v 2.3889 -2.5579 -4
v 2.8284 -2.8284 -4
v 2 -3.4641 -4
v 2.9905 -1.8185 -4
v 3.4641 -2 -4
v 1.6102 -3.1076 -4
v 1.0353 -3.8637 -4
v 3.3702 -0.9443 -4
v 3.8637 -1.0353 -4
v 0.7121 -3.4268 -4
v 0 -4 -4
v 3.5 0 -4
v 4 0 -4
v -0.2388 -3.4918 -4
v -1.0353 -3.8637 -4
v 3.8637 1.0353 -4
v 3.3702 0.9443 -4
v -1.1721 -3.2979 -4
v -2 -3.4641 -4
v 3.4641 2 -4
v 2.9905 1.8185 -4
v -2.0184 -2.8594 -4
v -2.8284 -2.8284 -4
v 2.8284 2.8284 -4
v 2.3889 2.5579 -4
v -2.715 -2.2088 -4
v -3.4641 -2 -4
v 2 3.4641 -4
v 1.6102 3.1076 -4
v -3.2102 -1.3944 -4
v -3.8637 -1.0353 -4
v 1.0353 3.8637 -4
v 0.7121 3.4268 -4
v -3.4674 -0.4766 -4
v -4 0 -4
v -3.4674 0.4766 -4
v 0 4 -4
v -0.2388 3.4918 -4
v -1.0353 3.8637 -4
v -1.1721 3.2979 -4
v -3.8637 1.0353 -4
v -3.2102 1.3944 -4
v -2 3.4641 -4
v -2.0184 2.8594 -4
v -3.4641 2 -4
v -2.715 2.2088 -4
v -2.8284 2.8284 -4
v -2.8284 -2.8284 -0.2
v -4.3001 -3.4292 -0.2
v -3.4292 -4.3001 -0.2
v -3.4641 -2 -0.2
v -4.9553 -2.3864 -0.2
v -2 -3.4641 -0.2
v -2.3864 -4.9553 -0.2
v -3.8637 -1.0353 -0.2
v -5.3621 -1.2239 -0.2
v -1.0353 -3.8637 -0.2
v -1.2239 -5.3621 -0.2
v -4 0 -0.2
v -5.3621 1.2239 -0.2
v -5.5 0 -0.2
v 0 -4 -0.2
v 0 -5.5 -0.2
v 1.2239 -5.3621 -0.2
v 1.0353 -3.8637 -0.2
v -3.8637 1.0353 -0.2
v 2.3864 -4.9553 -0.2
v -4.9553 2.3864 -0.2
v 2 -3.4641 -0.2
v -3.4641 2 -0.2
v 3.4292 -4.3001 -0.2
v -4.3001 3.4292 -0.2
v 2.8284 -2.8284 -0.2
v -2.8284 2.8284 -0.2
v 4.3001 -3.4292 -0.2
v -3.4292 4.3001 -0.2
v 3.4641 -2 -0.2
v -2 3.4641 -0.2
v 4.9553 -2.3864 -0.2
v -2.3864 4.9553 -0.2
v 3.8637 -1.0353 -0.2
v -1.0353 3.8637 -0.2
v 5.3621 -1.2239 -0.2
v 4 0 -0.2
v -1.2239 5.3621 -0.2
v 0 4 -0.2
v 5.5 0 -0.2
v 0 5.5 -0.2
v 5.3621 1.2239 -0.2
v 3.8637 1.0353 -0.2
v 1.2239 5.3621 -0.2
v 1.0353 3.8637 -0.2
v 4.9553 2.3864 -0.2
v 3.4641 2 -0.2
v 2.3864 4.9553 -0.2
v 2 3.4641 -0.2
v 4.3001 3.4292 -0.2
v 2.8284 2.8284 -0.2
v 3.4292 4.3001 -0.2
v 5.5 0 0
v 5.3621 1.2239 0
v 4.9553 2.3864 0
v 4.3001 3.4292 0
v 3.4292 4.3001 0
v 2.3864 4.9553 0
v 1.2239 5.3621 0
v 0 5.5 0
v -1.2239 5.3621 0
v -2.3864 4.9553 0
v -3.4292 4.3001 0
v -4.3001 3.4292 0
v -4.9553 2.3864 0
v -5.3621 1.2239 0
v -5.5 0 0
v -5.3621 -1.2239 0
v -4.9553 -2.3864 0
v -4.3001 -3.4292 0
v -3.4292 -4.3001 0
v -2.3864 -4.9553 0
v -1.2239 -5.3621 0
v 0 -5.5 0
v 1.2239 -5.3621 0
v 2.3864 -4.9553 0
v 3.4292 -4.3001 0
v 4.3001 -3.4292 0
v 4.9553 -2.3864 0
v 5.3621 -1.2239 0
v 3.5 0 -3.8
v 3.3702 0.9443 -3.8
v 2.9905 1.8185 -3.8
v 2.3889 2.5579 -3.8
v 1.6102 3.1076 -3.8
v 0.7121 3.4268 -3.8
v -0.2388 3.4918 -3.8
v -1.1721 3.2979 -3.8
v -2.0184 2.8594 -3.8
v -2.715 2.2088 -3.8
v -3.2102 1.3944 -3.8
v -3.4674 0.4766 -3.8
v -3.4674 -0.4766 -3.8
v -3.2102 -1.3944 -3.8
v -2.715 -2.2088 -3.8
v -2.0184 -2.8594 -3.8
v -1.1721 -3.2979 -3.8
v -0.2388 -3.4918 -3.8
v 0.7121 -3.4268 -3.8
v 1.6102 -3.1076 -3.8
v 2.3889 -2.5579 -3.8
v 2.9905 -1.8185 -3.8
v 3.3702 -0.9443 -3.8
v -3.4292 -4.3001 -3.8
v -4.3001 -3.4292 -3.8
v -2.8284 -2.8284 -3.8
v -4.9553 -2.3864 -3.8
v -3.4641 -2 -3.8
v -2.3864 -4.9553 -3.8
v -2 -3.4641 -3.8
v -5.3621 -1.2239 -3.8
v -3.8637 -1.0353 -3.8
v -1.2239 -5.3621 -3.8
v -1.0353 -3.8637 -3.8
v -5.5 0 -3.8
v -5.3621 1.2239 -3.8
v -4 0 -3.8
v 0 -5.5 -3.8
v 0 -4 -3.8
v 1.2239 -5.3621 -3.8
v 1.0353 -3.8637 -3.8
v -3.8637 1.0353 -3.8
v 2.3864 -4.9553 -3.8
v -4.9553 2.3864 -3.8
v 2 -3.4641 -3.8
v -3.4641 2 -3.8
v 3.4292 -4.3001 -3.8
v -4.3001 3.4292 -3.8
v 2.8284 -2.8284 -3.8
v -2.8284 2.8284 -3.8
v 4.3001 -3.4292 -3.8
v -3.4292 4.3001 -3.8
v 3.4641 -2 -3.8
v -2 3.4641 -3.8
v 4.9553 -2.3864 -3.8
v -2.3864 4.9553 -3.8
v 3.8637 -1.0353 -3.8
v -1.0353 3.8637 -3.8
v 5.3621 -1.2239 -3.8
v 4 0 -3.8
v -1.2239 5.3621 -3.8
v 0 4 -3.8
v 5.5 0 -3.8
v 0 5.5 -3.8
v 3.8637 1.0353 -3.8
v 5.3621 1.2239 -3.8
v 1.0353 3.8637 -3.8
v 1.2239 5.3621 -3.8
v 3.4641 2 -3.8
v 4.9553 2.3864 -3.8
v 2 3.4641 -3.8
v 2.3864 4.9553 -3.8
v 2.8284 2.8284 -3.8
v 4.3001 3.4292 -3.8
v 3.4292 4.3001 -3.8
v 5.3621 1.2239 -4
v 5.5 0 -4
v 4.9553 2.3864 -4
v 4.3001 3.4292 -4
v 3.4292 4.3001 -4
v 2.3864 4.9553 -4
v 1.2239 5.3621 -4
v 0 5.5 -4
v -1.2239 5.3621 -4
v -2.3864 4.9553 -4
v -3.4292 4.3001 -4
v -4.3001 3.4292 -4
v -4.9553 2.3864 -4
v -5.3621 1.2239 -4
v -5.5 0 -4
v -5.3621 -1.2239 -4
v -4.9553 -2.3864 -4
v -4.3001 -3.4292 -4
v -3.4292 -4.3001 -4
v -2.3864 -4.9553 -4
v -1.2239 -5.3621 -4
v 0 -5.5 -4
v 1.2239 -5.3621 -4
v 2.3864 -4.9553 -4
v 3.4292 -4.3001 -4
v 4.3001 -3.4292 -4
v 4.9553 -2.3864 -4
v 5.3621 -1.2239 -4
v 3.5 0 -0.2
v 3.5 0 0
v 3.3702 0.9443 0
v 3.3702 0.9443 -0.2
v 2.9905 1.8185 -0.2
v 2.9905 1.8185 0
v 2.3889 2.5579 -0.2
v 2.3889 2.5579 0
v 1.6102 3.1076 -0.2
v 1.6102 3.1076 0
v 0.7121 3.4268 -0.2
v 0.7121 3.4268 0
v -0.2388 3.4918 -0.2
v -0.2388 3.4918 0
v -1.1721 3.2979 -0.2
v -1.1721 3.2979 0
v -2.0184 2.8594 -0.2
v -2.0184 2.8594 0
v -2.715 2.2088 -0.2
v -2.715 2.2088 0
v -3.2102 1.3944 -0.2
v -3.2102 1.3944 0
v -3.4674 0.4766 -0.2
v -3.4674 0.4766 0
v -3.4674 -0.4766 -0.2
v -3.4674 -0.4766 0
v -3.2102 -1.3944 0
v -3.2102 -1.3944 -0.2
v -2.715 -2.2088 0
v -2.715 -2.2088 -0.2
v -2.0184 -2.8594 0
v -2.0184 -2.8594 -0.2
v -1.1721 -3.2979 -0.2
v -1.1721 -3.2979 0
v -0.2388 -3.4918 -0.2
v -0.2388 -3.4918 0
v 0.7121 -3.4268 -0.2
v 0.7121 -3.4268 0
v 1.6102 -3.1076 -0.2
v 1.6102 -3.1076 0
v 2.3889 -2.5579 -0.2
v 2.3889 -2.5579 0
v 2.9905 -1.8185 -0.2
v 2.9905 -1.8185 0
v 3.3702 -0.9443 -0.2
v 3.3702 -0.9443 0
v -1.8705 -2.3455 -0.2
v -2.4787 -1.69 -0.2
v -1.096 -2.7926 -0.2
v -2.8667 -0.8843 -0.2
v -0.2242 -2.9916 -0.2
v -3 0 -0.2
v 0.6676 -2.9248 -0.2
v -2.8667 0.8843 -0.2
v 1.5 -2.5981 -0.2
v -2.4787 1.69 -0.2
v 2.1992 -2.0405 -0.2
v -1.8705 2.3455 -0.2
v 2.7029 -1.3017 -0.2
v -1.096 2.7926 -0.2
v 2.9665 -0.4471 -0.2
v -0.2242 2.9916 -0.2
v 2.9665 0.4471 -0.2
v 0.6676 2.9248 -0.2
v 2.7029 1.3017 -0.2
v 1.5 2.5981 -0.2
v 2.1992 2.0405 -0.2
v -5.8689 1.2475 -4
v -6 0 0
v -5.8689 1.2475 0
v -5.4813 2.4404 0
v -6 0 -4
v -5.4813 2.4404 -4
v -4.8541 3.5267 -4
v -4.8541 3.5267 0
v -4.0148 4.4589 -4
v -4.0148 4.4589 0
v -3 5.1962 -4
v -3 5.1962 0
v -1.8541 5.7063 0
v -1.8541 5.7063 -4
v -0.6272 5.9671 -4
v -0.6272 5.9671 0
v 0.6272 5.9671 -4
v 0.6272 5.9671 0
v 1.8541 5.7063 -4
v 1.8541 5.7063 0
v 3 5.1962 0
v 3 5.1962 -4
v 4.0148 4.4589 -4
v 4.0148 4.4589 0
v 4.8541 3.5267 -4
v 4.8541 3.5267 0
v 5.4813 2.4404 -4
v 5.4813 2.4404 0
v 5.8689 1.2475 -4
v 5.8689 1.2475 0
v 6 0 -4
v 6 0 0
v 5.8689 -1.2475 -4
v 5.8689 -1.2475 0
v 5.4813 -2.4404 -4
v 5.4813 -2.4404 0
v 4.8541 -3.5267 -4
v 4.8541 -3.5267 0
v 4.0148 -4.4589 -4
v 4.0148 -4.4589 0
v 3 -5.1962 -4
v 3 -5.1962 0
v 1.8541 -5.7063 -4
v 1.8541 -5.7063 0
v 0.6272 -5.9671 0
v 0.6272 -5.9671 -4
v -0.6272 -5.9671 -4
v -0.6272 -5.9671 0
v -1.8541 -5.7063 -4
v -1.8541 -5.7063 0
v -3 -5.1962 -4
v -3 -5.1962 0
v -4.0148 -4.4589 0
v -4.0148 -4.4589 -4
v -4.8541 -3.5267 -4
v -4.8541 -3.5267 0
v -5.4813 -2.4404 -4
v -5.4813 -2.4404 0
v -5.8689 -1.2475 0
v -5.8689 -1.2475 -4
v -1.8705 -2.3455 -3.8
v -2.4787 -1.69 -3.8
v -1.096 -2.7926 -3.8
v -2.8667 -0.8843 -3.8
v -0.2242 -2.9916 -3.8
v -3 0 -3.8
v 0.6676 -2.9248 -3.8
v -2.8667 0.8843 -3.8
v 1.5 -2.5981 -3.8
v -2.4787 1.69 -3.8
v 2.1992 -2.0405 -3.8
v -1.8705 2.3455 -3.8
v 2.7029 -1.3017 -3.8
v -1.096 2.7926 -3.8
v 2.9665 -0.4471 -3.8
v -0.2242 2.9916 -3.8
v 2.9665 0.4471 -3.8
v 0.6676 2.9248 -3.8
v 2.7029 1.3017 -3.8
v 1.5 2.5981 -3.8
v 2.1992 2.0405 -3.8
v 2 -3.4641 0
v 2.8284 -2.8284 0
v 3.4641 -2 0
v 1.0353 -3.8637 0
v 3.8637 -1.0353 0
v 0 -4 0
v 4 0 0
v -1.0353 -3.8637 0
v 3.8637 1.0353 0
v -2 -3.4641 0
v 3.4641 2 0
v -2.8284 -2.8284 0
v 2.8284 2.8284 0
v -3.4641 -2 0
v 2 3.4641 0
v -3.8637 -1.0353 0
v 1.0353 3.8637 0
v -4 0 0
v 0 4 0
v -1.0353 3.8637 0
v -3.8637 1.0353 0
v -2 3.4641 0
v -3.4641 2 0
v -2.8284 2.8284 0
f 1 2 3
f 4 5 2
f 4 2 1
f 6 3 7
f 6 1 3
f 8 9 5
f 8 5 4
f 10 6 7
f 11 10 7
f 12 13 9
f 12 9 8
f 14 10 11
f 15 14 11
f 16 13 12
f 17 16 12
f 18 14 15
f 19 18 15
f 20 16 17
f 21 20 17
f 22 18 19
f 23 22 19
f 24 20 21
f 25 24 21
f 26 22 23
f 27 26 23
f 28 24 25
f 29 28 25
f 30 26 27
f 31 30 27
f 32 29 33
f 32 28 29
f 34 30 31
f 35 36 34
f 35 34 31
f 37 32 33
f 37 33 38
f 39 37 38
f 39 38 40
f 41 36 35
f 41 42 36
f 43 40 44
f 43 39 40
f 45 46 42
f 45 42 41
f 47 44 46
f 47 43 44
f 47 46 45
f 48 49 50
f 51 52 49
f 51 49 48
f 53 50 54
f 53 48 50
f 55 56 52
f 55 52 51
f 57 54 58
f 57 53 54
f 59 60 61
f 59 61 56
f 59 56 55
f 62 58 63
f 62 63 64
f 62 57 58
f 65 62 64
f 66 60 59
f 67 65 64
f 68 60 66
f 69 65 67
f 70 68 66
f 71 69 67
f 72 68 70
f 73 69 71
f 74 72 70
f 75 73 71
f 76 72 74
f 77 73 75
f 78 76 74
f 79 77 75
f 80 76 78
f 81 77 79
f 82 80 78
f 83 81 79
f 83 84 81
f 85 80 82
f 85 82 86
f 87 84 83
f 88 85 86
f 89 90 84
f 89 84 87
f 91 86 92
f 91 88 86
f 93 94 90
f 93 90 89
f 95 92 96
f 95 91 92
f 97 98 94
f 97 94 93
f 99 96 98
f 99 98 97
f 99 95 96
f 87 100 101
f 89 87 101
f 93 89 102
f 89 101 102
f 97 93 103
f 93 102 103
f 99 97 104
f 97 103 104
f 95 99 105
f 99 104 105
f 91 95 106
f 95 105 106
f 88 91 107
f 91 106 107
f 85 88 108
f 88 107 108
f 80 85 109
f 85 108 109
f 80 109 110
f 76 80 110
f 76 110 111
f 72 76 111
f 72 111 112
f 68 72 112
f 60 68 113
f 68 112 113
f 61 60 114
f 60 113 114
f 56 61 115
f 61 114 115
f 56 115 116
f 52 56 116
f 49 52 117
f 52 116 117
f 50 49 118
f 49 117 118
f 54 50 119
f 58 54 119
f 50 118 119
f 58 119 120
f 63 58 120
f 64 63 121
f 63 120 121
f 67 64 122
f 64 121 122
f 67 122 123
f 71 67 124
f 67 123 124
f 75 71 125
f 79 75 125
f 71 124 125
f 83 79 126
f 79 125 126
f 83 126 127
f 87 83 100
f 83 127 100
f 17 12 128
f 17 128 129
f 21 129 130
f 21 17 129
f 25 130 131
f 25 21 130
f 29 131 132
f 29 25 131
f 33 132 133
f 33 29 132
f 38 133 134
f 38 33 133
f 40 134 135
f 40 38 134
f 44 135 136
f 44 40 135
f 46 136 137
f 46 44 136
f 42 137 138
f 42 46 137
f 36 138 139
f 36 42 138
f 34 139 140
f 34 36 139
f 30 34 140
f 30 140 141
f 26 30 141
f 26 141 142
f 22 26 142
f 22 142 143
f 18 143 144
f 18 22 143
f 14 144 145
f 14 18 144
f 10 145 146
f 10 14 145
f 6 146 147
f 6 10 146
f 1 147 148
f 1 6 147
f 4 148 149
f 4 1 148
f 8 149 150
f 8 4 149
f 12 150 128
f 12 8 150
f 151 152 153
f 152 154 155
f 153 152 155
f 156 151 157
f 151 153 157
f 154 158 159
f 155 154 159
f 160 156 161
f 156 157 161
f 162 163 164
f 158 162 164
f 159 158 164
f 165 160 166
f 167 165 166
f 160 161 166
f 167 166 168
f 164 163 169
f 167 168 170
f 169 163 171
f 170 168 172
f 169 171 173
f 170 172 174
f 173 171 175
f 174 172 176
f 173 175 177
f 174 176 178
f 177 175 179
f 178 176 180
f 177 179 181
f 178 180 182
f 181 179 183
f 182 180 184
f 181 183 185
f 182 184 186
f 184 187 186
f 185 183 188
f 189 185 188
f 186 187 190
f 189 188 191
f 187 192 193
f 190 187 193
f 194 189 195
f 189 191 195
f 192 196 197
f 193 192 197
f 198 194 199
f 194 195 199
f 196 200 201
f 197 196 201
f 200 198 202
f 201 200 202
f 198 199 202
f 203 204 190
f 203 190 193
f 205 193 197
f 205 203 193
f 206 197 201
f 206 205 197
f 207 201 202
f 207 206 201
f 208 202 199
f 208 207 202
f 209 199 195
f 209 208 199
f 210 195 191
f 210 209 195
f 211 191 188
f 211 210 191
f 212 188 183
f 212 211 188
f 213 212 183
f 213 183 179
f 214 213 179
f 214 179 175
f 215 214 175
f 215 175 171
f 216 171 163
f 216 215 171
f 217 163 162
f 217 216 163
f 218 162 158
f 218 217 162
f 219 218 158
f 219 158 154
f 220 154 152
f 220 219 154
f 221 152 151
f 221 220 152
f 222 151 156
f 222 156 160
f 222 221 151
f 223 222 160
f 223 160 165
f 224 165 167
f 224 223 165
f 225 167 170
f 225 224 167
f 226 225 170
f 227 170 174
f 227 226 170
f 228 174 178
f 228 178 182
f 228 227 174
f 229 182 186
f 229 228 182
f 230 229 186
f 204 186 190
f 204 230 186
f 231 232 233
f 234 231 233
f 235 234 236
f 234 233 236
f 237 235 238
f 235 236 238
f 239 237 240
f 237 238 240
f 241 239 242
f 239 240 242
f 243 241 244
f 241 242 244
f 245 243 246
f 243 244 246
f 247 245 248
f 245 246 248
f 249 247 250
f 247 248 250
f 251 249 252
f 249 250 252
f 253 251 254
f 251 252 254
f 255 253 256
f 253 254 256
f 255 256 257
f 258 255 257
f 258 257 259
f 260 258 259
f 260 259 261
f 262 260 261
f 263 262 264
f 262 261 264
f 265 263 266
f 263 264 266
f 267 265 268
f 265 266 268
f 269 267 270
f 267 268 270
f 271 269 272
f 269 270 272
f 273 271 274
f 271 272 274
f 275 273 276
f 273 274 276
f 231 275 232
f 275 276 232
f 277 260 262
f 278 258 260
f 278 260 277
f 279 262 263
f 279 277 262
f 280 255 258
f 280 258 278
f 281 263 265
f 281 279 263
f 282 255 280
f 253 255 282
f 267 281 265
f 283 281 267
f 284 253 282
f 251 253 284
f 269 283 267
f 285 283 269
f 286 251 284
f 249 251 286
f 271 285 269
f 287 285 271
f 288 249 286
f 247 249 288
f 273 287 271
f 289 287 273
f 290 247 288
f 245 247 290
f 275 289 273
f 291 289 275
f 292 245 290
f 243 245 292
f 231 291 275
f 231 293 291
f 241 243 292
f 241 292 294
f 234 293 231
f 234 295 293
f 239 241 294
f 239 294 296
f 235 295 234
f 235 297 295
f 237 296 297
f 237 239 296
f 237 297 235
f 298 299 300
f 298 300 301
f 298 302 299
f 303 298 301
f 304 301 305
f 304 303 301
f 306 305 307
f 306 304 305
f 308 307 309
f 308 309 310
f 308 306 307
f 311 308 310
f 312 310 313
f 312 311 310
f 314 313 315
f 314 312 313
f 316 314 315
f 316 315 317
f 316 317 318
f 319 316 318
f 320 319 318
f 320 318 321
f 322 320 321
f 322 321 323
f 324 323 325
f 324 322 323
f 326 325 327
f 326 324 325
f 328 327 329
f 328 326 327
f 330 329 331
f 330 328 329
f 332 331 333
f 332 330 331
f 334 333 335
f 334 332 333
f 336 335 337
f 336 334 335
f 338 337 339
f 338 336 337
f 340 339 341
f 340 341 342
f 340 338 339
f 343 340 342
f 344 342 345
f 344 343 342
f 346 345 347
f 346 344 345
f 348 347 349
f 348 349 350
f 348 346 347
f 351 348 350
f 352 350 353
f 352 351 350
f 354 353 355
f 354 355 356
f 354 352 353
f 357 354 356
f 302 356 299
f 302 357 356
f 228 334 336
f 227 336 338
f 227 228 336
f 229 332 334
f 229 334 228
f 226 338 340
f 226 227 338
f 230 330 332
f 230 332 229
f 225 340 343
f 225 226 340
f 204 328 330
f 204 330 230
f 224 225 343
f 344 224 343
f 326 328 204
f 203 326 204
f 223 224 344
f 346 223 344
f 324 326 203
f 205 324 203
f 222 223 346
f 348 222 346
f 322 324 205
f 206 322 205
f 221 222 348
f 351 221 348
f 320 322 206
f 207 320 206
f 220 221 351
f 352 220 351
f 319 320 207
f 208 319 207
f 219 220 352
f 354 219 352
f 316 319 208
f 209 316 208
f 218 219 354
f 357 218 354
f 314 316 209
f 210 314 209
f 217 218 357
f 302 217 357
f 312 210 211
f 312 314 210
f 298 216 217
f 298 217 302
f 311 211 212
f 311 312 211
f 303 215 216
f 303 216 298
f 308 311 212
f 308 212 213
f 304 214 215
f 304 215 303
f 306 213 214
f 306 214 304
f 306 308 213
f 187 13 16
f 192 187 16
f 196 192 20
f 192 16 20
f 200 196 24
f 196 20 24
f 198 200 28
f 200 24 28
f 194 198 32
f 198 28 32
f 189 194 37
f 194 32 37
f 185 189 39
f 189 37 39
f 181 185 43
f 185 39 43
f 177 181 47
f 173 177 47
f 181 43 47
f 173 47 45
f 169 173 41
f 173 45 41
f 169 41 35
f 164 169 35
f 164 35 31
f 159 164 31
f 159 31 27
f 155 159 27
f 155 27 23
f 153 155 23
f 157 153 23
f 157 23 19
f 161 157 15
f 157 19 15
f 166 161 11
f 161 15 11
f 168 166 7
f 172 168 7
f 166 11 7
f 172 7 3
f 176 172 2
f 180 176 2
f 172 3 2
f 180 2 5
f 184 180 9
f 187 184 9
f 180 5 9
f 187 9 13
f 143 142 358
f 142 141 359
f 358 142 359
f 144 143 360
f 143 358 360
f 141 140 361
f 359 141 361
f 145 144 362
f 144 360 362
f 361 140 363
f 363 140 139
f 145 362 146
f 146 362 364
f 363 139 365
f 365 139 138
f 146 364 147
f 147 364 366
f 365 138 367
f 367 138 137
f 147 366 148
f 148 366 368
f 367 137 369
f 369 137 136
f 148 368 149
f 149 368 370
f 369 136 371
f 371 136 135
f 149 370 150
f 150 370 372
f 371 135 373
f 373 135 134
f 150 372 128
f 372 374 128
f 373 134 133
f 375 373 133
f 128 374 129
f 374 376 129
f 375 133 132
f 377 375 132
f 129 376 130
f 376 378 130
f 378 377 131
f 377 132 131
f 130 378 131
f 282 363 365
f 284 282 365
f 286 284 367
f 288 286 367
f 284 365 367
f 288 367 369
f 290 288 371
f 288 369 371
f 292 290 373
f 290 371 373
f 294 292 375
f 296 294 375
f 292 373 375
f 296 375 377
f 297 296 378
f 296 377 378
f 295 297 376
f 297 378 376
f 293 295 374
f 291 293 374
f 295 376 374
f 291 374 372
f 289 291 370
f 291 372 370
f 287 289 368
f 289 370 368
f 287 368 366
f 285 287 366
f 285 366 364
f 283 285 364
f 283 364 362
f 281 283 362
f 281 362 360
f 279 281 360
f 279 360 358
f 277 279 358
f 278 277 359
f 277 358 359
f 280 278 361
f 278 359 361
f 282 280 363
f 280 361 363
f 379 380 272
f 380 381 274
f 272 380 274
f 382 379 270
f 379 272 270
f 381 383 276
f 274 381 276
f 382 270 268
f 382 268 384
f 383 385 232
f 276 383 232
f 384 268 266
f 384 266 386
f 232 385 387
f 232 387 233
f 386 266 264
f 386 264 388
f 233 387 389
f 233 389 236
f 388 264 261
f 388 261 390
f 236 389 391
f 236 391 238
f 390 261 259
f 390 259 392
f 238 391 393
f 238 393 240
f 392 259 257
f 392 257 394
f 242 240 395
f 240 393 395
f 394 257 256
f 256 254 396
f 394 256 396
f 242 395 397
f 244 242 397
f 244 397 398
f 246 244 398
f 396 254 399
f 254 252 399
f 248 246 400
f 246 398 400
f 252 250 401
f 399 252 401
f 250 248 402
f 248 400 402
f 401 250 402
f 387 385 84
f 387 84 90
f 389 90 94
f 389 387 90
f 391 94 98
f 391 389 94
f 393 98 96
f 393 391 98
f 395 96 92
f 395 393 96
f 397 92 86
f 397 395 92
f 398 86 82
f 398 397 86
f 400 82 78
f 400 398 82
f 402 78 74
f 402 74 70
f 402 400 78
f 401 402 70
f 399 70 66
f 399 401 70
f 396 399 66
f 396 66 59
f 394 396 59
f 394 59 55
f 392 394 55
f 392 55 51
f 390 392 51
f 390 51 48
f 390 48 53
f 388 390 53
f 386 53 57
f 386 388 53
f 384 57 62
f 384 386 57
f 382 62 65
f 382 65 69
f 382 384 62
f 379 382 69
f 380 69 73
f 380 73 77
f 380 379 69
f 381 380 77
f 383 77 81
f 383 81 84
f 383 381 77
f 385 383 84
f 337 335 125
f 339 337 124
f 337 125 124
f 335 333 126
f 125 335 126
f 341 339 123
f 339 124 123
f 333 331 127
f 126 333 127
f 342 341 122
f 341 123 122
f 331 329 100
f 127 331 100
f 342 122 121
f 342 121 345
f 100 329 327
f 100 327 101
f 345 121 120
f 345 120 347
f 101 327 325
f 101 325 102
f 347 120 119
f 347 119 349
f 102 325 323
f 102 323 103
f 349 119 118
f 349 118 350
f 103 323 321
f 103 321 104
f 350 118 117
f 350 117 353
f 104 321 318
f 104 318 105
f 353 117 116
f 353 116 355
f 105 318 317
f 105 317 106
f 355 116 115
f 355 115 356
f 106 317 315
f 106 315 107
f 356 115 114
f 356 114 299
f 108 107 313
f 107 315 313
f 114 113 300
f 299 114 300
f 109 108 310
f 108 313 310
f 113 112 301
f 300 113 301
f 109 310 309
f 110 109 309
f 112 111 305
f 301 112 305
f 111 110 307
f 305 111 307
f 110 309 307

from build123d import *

# Parameters (mm, degrees)
SKETCH_1_W          = 3
SKETCH_1_H          = 4
SKETCH_2_R          = 3.5
CUT_EXTRUDE_1_DEPTH = 0.2
SKETCH_3_R          = 5.5
SKETCH_3_R_2        = 4
CUT_EXTRUDE_2_DEPTH = 0.2


with BuildPart() as part:
    # Эскиз1 → Повернуть1 (revolve)
    with BuildSketch(Plane(origin=(0, 0, 0), x_dir=(1, 0, 0), z_dir=(0, 1, 0))):
        with Locations((-4.5, 2)):
            Rectangle(SKETCH_1_W, SKETCH_1_H)
    revolve(axis=Axis((0, 0, 0), (0, 0, -1)))

    # Эскиз2 → Вырез-Вытянуть1 (cut)
    with BuildSketch(Plane.XY):
        Circle(SKETCH_2_R)
    cut_extrude_1 = extrude(amount=-CUT_EXTRUDE_1_DEPTH, mode=Mode.SUBTRACT)

    # Эскиз3 → Вырез-Вытянуть2 (cut)
    with BuildSketch(Plane.XY):
        Circle(SKETCH_3_R)
        Circle(SKETCH_3_R_2, mode=Mode.SUBTRACT)
    cut_extrude_2 = extrude(amount=-CUT_EXTRUDE_2_DEPTH, mode=Mode.SUBTRACT)

    # Зеркальное отражение1: Вырез-Вытянуть1, Вырез-Вытянуть2 across plane
    add(cut_extrude_1.mirror(Plane.XY.offset(-2)), mode=Mode.SUBTRACT)
    add(cut_extrude_2.mirror(Plane.XY.offset(-2)), mode=Mode.SUBTRACT)


solid = part.part
